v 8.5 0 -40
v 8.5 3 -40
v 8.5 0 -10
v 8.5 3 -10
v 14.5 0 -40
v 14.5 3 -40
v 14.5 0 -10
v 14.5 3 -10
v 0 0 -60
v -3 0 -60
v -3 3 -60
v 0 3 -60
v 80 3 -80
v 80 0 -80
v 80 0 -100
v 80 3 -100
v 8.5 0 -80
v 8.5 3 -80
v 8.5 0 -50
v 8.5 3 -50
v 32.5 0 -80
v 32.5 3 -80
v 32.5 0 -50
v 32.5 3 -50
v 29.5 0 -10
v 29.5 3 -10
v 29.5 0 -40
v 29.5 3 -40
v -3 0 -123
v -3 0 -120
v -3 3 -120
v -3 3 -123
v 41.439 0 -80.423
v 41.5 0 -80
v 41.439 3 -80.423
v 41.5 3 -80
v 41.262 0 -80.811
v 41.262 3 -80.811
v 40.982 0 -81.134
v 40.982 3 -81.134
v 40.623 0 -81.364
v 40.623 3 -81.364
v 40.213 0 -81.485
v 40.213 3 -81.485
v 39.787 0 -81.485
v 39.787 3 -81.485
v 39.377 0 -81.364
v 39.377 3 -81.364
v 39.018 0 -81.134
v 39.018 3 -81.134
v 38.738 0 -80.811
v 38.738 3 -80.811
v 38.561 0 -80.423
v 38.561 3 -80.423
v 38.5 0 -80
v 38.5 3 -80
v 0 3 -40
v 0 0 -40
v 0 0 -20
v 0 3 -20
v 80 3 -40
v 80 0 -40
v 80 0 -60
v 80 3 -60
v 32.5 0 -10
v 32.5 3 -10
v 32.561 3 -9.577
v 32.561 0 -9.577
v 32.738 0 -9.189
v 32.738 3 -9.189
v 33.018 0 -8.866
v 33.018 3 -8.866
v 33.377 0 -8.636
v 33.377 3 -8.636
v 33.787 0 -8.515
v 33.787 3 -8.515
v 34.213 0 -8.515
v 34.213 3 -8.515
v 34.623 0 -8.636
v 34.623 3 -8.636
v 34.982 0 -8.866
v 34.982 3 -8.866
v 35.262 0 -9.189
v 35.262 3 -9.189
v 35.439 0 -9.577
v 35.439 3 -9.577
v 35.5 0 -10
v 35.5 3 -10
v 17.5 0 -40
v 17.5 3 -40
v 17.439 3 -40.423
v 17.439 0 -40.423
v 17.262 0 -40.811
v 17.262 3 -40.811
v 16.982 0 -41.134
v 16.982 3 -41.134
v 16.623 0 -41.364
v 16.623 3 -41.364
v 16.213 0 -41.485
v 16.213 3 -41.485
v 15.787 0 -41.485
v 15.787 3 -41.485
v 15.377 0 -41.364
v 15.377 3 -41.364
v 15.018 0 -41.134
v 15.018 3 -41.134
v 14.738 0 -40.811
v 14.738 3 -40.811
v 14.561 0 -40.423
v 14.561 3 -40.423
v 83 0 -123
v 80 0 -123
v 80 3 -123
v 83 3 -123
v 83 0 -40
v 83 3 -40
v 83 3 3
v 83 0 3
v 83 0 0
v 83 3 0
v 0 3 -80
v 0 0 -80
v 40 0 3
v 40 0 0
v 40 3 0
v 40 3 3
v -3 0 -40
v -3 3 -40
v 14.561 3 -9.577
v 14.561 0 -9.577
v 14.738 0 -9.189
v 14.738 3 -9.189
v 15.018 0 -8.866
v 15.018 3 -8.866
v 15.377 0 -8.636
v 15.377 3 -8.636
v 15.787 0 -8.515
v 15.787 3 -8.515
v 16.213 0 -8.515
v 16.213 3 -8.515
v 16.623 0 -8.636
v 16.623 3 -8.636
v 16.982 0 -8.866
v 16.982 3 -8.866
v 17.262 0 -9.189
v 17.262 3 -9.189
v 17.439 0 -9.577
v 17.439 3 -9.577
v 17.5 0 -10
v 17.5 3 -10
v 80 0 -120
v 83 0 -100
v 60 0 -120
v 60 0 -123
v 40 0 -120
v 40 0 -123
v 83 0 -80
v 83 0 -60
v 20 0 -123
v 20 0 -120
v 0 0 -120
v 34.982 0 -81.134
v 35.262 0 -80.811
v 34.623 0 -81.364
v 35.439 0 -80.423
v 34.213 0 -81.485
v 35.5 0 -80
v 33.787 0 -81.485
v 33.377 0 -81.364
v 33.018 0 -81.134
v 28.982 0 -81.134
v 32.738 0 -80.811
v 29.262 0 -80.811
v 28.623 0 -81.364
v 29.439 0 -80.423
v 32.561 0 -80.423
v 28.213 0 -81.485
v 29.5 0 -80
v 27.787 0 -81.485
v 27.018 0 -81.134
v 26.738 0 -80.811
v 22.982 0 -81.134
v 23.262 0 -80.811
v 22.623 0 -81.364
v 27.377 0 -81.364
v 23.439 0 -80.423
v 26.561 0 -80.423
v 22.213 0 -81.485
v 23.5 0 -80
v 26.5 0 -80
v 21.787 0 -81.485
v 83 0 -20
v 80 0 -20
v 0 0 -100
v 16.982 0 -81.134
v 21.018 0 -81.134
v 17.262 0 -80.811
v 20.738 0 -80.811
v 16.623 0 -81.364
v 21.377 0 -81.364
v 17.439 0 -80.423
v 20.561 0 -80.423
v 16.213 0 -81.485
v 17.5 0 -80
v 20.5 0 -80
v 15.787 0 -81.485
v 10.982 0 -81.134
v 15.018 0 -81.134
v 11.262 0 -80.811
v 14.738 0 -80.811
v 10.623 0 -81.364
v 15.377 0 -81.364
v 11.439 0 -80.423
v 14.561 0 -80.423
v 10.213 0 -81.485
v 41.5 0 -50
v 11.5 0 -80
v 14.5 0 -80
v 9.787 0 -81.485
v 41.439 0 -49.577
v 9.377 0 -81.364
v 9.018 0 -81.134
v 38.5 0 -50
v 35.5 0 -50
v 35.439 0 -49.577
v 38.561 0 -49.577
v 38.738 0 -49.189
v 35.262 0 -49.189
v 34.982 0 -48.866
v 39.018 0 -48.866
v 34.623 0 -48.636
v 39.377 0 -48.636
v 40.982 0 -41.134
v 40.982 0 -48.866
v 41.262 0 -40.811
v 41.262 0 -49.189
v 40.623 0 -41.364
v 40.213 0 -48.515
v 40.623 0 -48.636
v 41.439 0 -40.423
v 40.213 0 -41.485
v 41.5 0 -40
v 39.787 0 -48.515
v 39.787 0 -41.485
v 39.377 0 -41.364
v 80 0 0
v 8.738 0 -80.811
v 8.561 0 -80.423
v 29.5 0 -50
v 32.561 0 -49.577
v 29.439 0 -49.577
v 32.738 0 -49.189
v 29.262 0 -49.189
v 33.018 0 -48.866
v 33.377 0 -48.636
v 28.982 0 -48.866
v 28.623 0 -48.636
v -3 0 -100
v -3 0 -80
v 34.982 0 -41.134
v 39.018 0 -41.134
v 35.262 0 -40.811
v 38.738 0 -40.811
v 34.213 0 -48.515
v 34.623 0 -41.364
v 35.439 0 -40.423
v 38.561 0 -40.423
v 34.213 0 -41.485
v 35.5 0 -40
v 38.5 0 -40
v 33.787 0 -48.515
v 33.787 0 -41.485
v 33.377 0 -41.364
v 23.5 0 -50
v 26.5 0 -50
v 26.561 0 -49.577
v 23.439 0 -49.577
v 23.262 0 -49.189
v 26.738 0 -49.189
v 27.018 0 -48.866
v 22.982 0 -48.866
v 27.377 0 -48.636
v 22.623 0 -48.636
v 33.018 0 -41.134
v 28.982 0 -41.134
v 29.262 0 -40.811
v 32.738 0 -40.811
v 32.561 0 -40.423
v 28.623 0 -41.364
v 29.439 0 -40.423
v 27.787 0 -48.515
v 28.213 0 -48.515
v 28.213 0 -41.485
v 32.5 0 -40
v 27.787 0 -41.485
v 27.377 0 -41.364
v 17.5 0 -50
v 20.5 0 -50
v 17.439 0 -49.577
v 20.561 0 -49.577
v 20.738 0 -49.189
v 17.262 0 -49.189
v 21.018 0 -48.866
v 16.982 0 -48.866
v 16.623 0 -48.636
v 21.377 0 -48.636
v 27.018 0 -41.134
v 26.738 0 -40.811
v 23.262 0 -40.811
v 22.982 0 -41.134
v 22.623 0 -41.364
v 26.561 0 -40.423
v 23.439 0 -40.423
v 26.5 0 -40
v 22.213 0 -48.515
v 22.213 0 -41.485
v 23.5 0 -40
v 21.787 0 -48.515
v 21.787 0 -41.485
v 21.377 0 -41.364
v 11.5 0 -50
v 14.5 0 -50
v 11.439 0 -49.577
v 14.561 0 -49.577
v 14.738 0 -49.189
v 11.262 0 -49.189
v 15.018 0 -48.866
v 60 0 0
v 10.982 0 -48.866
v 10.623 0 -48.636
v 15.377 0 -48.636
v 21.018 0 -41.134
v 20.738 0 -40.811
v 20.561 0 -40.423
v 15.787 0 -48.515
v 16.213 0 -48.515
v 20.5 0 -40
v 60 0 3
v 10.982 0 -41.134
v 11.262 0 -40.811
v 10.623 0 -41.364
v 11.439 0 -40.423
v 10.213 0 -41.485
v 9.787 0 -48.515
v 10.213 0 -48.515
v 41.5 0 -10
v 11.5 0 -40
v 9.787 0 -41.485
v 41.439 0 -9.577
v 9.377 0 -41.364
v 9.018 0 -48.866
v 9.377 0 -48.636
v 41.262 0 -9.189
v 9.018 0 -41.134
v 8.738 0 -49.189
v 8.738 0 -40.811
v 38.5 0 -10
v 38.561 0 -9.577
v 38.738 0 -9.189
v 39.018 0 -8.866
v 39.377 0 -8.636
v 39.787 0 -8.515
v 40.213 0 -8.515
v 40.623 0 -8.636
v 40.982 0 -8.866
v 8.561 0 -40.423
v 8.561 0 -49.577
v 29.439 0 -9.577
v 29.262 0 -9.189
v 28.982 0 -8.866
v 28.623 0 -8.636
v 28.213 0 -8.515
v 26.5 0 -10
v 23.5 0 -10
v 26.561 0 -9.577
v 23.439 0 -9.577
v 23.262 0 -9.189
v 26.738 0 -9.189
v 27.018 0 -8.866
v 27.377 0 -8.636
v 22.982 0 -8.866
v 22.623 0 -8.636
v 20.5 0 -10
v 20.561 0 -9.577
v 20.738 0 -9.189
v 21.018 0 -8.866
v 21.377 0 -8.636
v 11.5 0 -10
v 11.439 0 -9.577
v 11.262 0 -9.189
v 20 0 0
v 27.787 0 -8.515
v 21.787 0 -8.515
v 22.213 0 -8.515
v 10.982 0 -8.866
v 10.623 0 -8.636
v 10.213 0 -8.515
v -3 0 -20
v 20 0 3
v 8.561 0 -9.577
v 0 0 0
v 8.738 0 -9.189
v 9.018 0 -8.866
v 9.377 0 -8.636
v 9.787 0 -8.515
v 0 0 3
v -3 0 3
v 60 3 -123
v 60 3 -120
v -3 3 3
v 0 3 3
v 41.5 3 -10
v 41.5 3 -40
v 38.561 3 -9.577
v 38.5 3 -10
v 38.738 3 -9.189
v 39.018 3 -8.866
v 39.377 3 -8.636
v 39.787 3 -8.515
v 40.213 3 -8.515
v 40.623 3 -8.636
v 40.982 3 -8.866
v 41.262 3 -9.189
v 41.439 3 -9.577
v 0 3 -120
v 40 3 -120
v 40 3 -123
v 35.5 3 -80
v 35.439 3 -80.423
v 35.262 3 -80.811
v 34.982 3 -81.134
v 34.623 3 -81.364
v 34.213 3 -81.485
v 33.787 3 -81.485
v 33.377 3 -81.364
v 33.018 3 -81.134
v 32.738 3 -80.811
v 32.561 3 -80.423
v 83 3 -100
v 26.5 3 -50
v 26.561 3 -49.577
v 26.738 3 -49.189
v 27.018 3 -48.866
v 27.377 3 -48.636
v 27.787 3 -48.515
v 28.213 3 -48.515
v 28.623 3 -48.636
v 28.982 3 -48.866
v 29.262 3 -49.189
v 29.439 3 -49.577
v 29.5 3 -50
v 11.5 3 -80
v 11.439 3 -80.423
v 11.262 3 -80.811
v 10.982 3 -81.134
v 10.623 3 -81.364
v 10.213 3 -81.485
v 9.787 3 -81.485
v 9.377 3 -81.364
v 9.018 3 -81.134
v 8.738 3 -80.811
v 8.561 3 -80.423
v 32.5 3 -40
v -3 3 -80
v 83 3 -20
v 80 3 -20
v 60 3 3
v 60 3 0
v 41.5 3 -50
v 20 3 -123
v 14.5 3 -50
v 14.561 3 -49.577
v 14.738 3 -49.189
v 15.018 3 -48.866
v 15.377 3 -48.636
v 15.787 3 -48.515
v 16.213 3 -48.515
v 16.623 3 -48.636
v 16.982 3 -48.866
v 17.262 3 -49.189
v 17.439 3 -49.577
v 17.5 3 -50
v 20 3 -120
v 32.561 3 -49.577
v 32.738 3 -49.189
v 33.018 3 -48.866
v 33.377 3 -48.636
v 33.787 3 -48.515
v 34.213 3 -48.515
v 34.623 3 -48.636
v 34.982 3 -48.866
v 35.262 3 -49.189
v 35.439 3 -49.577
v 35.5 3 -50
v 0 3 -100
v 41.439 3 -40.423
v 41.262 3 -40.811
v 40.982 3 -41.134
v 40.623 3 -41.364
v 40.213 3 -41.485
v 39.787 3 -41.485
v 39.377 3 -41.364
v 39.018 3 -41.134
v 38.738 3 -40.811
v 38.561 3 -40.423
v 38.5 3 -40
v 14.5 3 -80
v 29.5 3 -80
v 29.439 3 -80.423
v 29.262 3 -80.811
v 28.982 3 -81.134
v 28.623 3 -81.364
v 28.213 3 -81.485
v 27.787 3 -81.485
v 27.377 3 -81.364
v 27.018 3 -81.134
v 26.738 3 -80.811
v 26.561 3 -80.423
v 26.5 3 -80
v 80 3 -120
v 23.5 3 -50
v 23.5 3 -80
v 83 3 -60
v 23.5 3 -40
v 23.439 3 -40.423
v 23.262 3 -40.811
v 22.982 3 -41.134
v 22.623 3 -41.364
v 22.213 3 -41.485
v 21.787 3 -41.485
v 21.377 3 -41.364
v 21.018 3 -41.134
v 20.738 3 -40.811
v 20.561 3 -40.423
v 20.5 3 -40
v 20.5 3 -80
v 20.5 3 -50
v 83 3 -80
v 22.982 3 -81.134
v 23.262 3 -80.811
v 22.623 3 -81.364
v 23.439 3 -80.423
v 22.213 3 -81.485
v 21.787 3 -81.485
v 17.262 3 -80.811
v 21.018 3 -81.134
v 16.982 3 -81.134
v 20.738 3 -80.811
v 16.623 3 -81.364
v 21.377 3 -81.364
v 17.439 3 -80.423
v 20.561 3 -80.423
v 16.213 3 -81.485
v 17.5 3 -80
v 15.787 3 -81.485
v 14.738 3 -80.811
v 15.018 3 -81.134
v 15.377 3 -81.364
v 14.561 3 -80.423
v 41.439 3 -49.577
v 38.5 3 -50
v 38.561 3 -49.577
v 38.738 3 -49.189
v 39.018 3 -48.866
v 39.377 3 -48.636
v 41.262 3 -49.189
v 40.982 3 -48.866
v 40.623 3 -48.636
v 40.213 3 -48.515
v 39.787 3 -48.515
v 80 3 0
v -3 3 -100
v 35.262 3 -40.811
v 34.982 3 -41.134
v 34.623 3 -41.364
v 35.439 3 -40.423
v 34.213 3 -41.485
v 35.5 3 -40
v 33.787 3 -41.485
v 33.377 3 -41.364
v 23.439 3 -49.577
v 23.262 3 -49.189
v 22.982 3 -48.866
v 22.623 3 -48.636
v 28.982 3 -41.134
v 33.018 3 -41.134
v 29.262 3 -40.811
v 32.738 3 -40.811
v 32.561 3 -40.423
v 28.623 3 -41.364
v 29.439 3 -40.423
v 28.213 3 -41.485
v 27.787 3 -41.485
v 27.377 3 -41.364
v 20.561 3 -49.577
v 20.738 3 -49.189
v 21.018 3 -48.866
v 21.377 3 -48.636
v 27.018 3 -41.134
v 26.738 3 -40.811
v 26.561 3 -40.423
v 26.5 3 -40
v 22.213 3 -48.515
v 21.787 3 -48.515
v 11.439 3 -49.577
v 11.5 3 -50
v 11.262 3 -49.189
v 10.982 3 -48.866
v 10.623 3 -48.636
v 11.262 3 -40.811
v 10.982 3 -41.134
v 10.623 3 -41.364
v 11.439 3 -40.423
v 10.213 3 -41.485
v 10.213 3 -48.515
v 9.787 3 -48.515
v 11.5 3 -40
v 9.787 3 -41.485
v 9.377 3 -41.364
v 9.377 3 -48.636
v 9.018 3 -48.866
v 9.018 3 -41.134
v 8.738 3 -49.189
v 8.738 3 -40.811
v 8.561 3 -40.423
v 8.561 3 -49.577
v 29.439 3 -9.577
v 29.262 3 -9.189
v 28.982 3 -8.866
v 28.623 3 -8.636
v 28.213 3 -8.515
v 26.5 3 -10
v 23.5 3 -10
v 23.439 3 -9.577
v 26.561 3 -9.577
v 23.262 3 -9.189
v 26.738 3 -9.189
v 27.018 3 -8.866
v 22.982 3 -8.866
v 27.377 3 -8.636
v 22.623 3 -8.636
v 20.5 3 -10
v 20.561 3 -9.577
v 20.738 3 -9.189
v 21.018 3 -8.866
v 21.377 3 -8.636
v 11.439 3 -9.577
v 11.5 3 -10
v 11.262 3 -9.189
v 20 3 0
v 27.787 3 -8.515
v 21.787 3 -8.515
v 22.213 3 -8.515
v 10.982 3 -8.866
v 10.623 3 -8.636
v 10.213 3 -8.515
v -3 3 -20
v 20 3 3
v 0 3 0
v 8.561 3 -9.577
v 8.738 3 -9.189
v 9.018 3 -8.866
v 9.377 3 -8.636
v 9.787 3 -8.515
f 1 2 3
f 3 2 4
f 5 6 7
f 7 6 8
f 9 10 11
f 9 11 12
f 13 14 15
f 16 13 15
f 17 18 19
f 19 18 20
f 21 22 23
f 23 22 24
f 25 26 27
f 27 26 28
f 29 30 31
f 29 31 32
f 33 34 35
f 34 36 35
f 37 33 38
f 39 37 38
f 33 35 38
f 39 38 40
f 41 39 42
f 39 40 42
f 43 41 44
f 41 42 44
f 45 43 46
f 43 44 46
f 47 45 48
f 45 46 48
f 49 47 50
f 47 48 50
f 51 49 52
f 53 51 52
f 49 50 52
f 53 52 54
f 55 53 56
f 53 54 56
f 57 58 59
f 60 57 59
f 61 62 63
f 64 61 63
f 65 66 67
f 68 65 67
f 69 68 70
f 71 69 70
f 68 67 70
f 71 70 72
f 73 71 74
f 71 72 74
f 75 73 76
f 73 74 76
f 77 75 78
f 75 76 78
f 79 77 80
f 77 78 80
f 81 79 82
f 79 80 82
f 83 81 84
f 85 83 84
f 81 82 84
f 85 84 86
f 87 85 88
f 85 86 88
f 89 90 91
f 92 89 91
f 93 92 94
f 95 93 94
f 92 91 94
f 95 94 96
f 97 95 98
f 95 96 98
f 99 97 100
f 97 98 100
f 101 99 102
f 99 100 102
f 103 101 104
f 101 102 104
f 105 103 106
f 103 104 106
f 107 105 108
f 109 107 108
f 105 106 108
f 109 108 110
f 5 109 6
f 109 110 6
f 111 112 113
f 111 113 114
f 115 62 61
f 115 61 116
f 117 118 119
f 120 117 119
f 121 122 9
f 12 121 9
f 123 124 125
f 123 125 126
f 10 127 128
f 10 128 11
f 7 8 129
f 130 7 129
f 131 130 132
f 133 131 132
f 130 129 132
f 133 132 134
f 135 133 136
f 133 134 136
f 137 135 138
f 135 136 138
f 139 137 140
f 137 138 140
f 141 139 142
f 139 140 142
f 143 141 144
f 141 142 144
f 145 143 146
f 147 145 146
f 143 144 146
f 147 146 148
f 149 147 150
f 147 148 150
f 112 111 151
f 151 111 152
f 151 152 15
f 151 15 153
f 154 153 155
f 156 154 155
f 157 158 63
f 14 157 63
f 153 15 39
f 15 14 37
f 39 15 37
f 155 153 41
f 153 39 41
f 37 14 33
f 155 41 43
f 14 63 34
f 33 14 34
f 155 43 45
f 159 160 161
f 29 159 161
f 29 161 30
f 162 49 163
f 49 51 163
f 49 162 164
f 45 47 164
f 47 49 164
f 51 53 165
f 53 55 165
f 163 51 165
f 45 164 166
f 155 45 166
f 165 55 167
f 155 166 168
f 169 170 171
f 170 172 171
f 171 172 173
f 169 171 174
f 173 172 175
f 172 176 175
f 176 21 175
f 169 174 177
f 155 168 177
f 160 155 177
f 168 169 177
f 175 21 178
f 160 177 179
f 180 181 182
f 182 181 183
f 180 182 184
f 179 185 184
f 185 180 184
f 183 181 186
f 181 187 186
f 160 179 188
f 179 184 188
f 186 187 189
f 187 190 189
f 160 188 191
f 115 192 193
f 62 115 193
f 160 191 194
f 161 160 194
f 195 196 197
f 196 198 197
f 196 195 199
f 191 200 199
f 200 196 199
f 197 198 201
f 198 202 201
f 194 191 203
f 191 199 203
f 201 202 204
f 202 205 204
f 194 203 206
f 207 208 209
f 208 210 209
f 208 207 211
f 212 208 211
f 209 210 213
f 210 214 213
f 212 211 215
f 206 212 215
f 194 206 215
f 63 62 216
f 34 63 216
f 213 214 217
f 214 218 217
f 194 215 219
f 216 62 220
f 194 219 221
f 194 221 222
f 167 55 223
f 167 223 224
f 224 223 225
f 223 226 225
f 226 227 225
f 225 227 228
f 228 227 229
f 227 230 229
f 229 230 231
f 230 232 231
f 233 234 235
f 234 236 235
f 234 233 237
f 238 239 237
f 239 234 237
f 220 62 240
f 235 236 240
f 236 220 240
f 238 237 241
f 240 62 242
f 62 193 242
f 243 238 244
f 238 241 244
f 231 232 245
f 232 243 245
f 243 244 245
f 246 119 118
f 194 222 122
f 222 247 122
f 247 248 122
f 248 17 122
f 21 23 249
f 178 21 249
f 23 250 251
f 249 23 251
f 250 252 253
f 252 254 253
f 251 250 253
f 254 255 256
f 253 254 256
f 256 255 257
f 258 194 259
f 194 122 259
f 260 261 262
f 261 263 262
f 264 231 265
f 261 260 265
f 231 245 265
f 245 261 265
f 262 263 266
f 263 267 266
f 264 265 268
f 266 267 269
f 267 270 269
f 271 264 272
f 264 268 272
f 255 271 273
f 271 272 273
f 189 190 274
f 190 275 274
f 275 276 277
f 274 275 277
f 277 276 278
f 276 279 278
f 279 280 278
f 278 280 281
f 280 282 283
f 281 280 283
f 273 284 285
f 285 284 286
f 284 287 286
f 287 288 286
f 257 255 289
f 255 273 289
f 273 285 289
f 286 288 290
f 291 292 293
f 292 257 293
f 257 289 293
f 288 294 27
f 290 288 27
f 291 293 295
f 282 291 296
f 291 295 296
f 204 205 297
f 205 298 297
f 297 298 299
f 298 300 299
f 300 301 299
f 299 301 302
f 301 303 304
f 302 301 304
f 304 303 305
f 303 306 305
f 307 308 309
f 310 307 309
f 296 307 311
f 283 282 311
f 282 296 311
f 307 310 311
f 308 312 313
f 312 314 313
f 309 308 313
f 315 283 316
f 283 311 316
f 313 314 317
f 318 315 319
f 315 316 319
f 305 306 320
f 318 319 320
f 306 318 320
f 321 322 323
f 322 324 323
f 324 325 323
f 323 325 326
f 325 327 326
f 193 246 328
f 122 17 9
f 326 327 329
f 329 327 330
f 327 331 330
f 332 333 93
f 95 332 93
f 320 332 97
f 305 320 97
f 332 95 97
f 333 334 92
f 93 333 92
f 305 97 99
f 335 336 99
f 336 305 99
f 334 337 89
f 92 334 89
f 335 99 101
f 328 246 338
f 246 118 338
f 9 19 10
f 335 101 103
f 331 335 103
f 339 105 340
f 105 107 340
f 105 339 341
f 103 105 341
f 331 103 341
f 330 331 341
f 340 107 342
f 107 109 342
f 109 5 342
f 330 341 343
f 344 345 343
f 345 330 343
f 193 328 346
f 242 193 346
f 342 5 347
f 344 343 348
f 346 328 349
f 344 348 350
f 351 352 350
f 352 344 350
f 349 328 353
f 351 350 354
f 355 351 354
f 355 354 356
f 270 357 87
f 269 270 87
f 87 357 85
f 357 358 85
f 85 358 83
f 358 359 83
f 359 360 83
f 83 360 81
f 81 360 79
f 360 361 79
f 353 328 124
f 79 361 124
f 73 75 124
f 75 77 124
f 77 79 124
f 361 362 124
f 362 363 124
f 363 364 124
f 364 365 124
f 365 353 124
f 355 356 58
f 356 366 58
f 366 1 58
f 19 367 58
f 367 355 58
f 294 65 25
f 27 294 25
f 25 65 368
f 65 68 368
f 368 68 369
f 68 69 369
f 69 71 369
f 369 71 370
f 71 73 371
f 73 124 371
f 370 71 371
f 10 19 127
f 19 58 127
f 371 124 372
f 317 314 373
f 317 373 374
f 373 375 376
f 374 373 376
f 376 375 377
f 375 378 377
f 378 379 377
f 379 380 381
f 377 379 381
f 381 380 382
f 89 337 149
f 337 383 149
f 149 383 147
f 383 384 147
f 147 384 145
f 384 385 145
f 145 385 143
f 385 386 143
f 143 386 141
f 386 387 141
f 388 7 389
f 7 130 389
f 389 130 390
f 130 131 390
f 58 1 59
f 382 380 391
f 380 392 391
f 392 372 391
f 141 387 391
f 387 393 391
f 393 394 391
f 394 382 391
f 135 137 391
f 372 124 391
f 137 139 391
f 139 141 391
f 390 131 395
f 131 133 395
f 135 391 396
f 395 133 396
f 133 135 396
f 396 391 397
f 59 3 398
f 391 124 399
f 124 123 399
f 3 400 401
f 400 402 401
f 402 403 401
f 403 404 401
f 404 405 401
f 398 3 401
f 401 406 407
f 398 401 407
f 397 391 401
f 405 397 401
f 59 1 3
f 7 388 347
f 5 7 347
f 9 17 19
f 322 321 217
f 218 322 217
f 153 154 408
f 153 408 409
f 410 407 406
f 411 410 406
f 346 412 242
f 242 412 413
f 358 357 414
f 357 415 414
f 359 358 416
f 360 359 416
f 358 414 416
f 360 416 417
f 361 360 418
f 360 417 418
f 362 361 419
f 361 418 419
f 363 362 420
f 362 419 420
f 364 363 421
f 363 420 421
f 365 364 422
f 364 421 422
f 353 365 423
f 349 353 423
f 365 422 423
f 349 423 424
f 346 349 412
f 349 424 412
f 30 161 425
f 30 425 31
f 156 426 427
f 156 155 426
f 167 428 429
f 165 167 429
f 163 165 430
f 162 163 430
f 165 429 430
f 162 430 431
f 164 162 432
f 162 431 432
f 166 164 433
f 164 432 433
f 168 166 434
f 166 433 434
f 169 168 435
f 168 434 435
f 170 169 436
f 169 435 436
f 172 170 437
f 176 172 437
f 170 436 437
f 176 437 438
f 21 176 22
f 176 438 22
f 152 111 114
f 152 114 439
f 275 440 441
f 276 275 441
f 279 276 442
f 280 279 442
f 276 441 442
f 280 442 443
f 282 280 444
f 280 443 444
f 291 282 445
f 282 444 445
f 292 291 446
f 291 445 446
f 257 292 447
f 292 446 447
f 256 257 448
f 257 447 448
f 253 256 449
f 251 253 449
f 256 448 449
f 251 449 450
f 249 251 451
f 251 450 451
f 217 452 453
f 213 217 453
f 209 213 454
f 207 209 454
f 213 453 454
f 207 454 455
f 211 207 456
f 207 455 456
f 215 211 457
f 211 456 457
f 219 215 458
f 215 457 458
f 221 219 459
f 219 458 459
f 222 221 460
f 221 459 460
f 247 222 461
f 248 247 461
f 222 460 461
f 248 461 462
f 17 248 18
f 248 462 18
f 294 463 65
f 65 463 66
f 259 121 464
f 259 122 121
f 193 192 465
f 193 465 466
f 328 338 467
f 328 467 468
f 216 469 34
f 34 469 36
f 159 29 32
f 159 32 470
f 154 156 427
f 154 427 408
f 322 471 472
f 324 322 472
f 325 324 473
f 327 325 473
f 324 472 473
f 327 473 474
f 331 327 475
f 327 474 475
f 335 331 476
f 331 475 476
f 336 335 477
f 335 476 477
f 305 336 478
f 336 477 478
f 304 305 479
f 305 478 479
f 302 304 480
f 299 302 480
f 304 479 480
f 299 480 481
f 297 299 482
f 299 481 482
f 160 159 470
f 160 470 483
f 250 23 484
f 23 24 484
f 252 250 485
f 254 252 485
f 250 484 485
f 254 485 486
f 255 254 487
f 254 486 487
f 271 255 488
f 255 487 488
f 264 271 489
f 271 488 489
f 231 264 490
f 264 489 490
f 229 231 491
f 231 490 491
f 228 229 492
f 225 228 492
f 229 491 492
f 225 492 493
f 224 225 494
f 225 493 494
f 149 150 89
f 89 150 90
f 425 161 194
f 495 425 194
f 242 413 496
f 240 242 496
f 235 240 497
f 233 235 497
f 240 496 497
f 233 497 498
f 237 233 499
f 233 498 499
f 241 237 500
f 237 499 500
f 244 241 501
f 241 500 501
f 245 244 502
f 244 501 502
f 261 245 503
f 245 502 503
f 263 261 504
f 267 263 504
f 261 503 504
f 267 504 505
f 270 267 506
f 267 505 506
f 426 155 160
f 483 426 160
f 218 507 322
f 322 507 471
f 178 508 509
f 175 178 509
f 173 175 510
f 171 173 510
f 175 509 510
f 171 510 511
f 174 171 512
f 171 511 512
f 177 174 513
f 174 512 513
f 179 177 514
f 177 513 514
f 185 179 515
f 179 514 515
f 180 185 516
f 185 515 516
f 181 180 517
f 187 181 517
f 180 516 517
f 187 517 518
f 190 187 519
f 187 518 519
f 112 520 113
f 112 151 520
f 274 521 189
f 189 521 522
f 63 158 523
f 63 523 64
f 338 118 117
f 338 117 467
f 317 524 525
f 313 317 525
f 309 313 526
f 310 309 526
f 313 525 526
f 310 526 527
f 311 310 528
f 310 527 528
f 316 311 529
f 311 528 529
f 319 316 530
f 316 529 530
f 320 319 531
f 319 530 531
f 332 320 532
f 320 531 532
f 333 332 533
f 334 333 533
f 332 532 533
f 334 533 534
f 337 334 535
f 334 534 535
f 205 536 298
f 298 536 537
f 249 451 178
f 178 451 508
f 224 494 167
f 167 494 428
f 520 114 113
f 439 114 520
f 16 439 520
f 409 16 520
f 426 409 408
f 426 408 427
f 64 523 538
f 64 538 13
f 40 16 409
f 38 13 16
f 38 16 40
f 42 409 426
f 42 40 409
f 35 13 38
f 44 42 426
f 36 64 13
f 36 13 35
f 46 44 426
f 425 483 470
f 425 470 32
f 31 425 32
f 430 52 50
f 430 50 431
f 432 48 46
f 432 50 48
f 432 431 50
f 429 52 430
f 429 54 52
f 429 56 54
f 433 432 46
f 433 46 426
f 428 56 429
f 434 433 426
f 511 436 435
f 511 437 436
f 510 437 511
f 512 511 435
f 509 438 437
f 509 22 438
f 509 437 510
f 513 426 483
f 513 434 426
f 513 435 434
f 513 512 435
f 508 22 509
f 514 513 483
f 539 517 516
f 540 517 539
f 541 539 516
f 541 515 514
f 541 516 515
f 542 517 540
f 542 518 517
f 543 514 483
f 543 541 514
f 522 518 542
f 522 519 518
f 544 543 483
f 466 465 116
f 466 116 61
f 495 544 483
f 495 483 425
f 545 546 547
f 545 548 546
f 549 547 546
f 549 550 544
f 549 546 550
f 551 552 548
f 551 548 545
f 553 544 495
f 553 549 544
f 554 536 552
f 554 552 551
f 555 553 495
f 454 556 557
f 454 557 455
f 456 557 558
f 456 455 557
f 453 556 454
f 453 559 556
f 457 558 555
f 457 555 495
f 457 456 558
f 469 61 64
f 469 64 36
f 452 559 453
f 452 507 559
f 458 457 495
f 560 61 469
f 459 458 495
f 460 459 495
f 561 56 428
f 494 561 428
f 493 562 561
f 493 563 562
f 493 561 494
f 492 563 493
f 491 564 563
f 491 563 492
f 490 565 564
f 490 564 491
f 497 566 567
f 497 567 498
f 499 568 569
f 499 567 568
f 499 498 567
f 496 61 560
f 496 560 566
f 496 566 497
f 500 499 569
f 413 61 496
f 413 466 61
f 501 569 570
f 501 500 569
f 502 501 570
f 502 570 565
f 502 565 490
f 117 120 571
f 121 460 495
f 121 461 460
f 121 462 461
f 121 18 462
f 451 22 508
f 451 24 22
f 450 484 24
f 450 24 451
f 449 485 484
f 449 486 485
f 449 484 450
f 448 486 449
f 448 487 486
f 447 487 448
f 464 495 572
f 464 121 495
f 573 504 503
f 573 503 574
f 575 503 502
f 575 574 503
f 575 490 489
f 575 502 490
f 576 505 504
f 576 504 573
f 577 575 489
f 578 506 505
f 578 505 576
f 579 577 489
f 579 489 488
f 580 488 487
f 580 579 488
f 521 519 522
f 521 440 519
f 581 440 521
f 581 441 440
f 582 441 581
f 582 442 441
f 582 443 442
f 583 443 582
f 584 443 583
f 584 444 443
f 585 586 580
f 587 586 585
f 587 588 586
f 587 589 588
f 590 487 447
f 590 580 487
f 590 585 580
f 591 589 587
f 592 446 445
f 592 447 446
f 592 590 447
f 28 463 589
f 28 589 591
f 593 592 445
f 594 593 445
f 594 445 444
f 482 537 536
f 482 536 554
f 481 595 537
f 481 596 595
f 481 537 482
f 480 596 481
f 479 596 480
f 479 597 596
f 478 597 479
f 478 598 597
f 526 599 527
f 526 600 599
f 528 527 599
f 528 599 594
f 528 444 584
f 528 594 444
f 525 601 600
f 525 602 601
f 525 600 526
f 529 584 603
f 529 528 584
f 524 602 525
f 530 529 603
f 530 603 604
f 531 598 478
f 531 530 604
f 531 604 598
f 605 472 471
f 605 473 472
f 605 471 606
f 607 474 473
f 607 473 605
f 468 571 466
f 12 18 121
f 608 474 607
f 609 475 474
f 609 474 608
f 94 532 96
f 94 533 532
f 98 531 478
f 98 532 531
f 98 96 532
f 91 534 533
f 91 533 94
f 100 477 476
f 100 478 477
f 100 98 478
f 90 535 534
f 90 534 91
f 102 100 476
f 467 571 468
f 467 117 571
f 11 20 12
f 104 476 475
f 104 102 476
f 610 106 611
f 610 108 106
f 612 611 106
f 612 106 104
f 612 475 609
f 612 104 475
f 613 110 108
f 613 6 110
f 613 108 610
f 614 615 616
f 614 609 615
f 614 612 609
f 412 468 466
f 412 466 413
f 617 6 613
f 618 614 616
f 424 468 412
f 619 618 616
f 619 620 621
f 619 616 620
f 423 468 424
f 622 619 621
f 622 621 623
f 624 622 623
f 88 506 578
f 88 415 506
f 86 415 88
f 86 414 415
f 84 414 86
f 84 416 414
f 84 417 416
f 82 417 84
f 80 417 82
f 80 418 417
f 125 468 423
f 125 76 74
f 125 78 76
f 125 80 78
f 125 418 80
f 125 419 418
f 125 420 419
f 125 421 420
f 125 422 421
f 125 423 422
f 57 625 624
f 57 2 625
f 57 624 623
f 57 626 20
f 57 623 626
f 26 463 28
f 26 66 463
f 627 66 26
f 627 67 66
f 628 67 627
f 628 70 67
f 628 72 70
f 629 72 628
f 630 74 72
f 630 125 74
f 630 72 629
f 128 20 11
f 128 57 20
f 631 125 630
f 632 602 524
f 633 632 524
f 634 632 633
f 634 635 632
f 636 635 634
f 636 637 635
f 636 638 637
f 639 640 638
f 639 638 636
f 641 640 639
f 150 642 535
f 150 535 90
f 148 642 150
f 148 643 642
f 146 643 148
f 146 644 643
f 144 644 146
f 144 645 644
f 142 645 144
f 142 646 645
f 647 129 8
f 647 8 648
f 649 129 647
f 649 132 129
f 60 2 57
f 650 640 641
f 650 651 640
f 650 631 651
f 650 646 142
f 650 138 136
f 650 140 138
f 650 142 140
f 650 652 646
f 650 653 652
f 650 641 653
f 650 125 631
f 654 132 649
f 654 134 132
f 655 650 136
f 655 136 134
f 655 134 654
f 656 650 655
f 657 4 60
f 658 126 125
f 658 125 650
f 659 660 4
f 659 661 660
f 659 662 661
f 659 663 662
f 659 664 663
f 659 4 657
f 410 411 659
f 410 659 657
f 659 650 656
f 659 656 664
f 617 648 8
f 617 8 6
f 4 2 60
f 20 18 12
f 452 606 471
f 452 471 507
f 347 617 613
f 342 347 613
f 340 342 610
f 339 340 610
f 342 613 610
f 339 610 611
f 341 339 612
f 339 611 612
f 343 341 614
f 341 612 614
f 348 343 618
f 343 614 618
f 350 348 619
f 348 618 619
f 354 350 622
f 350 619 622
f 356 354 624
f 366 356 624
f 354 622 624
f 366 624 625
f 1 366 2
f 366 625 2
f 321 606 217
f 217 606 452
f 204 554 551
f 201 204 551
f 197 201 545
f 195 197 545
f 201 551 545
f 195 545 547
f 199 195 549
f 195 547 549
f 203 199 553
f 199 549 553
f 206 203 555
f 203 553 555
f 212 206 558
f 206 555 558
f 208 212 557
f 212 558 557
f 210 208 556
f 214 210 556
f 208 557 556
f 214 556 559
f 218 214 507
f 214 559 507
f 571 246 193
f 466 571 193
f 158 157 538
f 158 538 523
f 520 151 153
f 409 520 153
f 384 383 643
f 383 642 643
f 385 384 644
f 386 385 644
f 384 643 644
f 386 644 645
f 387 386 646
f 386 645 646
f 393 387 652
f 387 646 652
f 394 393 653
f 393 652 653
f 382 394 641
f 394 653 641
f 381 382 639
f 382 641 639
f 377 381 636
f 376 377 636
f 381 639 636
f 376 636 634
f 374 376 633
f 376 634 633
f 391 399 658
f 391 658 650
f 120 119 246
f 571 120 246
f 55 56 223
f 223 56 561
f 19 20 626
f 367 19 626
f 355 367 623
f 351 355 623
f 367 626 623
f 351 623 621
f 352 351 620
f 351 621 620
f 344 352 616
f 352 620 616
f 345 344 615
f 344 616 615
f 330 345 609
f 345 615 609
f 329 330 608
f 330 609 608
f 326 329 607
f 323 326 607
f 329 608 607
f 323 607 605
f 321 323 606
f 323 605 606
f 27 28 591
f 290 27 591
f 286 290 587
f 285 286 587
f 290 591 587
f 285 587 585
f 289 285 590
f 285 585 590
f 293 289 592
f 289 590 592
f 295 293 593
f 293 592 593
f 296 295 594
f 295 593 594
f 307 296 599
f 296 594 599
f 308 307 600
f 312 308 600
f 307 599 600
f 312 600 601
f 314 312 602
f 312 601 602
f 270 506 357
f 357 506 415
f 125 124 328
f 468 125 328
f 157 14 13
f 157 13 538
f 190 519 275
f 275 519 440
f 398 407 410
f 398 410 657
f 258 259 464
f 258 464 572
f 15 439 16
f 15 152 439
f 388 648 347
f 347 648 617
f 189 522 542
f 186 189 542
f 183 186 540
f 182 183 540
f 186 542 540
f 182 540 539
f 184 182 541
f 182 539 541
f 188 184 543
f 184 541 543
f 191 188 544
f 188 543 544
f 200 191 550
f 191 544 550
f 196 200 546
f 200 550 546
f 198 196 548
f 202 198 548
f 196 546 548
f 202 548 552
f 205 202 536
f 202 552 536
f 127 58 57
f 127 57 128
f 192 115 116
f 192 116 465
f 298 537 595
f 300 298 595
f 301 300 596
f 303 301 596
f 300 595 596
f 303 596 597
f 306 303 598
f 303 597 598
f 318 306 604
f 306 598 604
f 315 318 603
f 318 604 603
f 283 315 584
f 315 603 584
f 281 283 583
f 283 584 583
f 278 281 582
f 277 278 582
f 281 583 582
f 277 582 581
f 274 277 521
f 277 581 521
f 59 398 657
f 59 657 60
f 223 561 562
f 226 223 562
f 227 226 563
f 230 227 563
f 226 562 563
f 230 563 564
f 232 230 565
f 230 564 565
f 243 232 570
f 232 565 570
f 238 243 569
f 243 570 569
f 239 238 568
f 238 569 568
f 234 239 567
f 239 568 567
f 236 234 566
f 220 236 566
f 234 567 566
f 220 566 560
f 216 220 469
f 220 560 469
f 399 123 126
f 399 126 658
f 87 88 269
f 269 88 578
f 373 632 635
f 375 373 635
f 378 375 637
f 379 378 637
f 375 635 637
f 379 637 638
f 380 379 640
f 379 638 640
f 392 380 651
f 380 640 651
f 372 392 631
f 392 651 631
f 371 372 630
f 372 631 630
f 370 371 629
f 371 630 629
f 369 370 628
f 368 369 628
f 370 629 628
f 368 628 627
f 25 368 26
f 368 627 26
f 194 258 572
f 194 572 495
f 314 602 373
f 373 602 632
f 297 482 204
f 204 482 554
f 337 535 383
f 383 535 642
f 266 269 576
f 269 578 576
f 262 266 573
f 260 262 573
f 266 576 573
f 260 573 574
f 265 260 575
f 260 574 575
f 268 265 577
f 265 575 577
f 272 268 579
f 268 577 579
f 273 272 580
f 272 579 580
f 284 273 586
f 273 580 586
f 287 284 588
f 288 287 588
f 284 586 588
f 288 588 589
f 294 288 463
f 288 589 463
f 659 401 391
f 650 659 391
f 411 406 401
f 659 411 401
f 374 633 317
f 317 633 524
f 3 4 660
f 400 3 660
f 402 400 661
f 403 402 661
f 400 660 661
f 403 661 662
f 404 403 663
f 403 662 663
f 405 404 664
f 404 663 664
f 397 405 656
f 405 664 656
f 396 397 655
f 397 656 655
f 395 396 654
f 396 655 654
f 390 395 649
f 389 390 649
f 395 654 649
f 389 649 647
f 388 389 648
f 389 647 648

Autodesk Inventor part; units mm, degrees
ref_plane "YZ Plane" through (0, 0, 0) normal (1, 0, 0) x (0, 1, 0)
ref_plane "XZ Plane" through (0, 0, 0) normal (0, 1, 0) x (-1, 0, 0)
ref_plane "XY Plane" through (0, 0, 0) normal (0, 0, 1) x (1, 0, 0)
sketch "Sketch1" plane through (0, 0, 0) normal (0, 1, 0) x (-1, 0, 0)
  line L0 (0, 0) -> (-80, 0)
  line L1 (-80, 0) -> (-80, -120)
  line L2 (-80, -120) -> (0, -120)
  line L3 (0, -120) -> (0, 0)
  line L4 (0, -120) -> (0, -123)
  line L5 (0, -123) -> (-20, -123)
  line L6 (-20, -123) -> (-20, -120)
  line L7 (-40, -123) -> (-60, -123)
  line L8 (-60, -123) -> (-60, -120)
  line L9 (-40, -120) -> (-40, -123)
  line L10 (-80, 0) -> (-80, 3)
  line L11 (-80, 3) -> (-60, 3)
  line L12 (-60, 3) -> (-60, 0)
  line L13 (-40, 3) -> (-20, 3)
  line L14 (-40, 0) -> (-40, 3)
  line L15 (-20, 3) -> (-20, 0)
  line L16 (0, 0) -> (3, 0)
  line L17 (3, 0) -> (3, -20)
  line L18 (3, -20) -> (0, -20)
  line L19 (3, -60) -> (0, -60)
  line L20 (3, -40) -> (3, -60)
  line L21 (0, -40) -> (3, -40)
  line L22 (3, -100) -> (0, -100)
  line L23 (3, -80) -> (3, -100)
  line L24 (0, -80) -> (3, -80)
  line L25 (-80, -120) -> (-83, -120)
  line L26 (-83, -120) -> (-83, -100)
  line L27 (-83, -100) -> (-80, -100)
  line L28 (-83, -60) -> (-80, -60)
  line L29 (-83, -80) -> (-83, -60)
  line L30 (-80, -80) -> (-83, -80)
  line L31 (-83, -20) -> (-80, -20)
  line L32 (-83, -40) -> (-83, -20)
  line L33 (-80, -40) -> (-83, -40)
  line L34 (0, -20) -> (0, -40)
  line L35 (0, -60) -> (0, -80)
  line L36 (0, -100) -> (0, -123)
  line L37 (-20, -120) -> (-40, -120)
  line L38 (-60, -120) -> (-83, -120)
  line L39 (-80, -100) -> (-80, -80)
  line L40 (-80, -60) -> (-80, -40)
  line L41 (-80, -20) -> (-80, 3)
  line L42 (-60, 0) -> (-40, 0)
  line L43 (-20, 0) -> (3, 0)
  line L44 (-80, 3) -> (-83, 3)
  line L45 (-83, 3) -> (-83, 0)
  line L46 (-83, 0) -> (-80, 0)
  line L47 (3, 0) -> (3, 3)
  line L48 (3, 3) -> (0, 3)
  line L49 (0, 3) -> (0, 0)
  line L50 (0, -120) -> (3, -120)
  line L51 (3, -120) -> (3, -123)
  line L52 (3, -123) -> (0, -123)
  line L53 (-80, -120) -> (-80, -123)
  line L54 (-80, -123) -> (-83, -123)
  line L55 (-83, -123) -> (-83, -120)
  dimension "d0" = 120
  dimension "d1" = 80
  dimension "d2" = 3
  dimension "d3" = 20
  dimension "d13" = 40
  dimension "d18" = 3
  dimension "d19" = 20
  dimension "d22" = 40
  dimension "d27" = 3
  dimension "d28" = 20
  dimension "d31" = 40
  dimension "d36" = 3
  dimension "d37" = 20
  dimension "d40" = 40
  dimension "d47" = 3
  dimension "d48" = 3
  dimension "d49" = 3
extrude "Extrusion3" add sketch "Sketch1" along normal blind 3
sketch "Sketch2" plane through (0, 3, 0) normal (0, 1, 0) x (1, 0, 0)
  line L0 (10, 10) -> (10, 40) construction
  line L1 (11.5, 10) -> (11.5, 40)
  line L2 (8.5, 40) -> (8.5, 10)
  arc A0 (8.5, 10) -> (11.5, 10) centre (10, 10) ccw
  arc A1 (11.5, 40) -> (8.5, 40) centre (10, 40) ccw
  line L3 (0, 40) -> (0, 20) projected
  line L4 (0, 0) -> (20, 0) projected
  point P0 (10, 25)
  dimension "d50" = 30
  dimension "d51" = 3
  dimension "d52" = 10
  dimension "d53" = 10
extrude "Extrusion4" cut sketch "Sketch2" against normal up to next
pattern_linear "Rectangular Pattern2" count 2 spacing 40 along (0, 0, -1) of "Extrusion4"
pattern_linear "Rectangular Pattern3" count 6 spacing 6 along (1, 0, 0) of "Extrusion4", "Rectangular Pattern2"
properties part number "ControlBoxTop" material "Wood (Birch)"
